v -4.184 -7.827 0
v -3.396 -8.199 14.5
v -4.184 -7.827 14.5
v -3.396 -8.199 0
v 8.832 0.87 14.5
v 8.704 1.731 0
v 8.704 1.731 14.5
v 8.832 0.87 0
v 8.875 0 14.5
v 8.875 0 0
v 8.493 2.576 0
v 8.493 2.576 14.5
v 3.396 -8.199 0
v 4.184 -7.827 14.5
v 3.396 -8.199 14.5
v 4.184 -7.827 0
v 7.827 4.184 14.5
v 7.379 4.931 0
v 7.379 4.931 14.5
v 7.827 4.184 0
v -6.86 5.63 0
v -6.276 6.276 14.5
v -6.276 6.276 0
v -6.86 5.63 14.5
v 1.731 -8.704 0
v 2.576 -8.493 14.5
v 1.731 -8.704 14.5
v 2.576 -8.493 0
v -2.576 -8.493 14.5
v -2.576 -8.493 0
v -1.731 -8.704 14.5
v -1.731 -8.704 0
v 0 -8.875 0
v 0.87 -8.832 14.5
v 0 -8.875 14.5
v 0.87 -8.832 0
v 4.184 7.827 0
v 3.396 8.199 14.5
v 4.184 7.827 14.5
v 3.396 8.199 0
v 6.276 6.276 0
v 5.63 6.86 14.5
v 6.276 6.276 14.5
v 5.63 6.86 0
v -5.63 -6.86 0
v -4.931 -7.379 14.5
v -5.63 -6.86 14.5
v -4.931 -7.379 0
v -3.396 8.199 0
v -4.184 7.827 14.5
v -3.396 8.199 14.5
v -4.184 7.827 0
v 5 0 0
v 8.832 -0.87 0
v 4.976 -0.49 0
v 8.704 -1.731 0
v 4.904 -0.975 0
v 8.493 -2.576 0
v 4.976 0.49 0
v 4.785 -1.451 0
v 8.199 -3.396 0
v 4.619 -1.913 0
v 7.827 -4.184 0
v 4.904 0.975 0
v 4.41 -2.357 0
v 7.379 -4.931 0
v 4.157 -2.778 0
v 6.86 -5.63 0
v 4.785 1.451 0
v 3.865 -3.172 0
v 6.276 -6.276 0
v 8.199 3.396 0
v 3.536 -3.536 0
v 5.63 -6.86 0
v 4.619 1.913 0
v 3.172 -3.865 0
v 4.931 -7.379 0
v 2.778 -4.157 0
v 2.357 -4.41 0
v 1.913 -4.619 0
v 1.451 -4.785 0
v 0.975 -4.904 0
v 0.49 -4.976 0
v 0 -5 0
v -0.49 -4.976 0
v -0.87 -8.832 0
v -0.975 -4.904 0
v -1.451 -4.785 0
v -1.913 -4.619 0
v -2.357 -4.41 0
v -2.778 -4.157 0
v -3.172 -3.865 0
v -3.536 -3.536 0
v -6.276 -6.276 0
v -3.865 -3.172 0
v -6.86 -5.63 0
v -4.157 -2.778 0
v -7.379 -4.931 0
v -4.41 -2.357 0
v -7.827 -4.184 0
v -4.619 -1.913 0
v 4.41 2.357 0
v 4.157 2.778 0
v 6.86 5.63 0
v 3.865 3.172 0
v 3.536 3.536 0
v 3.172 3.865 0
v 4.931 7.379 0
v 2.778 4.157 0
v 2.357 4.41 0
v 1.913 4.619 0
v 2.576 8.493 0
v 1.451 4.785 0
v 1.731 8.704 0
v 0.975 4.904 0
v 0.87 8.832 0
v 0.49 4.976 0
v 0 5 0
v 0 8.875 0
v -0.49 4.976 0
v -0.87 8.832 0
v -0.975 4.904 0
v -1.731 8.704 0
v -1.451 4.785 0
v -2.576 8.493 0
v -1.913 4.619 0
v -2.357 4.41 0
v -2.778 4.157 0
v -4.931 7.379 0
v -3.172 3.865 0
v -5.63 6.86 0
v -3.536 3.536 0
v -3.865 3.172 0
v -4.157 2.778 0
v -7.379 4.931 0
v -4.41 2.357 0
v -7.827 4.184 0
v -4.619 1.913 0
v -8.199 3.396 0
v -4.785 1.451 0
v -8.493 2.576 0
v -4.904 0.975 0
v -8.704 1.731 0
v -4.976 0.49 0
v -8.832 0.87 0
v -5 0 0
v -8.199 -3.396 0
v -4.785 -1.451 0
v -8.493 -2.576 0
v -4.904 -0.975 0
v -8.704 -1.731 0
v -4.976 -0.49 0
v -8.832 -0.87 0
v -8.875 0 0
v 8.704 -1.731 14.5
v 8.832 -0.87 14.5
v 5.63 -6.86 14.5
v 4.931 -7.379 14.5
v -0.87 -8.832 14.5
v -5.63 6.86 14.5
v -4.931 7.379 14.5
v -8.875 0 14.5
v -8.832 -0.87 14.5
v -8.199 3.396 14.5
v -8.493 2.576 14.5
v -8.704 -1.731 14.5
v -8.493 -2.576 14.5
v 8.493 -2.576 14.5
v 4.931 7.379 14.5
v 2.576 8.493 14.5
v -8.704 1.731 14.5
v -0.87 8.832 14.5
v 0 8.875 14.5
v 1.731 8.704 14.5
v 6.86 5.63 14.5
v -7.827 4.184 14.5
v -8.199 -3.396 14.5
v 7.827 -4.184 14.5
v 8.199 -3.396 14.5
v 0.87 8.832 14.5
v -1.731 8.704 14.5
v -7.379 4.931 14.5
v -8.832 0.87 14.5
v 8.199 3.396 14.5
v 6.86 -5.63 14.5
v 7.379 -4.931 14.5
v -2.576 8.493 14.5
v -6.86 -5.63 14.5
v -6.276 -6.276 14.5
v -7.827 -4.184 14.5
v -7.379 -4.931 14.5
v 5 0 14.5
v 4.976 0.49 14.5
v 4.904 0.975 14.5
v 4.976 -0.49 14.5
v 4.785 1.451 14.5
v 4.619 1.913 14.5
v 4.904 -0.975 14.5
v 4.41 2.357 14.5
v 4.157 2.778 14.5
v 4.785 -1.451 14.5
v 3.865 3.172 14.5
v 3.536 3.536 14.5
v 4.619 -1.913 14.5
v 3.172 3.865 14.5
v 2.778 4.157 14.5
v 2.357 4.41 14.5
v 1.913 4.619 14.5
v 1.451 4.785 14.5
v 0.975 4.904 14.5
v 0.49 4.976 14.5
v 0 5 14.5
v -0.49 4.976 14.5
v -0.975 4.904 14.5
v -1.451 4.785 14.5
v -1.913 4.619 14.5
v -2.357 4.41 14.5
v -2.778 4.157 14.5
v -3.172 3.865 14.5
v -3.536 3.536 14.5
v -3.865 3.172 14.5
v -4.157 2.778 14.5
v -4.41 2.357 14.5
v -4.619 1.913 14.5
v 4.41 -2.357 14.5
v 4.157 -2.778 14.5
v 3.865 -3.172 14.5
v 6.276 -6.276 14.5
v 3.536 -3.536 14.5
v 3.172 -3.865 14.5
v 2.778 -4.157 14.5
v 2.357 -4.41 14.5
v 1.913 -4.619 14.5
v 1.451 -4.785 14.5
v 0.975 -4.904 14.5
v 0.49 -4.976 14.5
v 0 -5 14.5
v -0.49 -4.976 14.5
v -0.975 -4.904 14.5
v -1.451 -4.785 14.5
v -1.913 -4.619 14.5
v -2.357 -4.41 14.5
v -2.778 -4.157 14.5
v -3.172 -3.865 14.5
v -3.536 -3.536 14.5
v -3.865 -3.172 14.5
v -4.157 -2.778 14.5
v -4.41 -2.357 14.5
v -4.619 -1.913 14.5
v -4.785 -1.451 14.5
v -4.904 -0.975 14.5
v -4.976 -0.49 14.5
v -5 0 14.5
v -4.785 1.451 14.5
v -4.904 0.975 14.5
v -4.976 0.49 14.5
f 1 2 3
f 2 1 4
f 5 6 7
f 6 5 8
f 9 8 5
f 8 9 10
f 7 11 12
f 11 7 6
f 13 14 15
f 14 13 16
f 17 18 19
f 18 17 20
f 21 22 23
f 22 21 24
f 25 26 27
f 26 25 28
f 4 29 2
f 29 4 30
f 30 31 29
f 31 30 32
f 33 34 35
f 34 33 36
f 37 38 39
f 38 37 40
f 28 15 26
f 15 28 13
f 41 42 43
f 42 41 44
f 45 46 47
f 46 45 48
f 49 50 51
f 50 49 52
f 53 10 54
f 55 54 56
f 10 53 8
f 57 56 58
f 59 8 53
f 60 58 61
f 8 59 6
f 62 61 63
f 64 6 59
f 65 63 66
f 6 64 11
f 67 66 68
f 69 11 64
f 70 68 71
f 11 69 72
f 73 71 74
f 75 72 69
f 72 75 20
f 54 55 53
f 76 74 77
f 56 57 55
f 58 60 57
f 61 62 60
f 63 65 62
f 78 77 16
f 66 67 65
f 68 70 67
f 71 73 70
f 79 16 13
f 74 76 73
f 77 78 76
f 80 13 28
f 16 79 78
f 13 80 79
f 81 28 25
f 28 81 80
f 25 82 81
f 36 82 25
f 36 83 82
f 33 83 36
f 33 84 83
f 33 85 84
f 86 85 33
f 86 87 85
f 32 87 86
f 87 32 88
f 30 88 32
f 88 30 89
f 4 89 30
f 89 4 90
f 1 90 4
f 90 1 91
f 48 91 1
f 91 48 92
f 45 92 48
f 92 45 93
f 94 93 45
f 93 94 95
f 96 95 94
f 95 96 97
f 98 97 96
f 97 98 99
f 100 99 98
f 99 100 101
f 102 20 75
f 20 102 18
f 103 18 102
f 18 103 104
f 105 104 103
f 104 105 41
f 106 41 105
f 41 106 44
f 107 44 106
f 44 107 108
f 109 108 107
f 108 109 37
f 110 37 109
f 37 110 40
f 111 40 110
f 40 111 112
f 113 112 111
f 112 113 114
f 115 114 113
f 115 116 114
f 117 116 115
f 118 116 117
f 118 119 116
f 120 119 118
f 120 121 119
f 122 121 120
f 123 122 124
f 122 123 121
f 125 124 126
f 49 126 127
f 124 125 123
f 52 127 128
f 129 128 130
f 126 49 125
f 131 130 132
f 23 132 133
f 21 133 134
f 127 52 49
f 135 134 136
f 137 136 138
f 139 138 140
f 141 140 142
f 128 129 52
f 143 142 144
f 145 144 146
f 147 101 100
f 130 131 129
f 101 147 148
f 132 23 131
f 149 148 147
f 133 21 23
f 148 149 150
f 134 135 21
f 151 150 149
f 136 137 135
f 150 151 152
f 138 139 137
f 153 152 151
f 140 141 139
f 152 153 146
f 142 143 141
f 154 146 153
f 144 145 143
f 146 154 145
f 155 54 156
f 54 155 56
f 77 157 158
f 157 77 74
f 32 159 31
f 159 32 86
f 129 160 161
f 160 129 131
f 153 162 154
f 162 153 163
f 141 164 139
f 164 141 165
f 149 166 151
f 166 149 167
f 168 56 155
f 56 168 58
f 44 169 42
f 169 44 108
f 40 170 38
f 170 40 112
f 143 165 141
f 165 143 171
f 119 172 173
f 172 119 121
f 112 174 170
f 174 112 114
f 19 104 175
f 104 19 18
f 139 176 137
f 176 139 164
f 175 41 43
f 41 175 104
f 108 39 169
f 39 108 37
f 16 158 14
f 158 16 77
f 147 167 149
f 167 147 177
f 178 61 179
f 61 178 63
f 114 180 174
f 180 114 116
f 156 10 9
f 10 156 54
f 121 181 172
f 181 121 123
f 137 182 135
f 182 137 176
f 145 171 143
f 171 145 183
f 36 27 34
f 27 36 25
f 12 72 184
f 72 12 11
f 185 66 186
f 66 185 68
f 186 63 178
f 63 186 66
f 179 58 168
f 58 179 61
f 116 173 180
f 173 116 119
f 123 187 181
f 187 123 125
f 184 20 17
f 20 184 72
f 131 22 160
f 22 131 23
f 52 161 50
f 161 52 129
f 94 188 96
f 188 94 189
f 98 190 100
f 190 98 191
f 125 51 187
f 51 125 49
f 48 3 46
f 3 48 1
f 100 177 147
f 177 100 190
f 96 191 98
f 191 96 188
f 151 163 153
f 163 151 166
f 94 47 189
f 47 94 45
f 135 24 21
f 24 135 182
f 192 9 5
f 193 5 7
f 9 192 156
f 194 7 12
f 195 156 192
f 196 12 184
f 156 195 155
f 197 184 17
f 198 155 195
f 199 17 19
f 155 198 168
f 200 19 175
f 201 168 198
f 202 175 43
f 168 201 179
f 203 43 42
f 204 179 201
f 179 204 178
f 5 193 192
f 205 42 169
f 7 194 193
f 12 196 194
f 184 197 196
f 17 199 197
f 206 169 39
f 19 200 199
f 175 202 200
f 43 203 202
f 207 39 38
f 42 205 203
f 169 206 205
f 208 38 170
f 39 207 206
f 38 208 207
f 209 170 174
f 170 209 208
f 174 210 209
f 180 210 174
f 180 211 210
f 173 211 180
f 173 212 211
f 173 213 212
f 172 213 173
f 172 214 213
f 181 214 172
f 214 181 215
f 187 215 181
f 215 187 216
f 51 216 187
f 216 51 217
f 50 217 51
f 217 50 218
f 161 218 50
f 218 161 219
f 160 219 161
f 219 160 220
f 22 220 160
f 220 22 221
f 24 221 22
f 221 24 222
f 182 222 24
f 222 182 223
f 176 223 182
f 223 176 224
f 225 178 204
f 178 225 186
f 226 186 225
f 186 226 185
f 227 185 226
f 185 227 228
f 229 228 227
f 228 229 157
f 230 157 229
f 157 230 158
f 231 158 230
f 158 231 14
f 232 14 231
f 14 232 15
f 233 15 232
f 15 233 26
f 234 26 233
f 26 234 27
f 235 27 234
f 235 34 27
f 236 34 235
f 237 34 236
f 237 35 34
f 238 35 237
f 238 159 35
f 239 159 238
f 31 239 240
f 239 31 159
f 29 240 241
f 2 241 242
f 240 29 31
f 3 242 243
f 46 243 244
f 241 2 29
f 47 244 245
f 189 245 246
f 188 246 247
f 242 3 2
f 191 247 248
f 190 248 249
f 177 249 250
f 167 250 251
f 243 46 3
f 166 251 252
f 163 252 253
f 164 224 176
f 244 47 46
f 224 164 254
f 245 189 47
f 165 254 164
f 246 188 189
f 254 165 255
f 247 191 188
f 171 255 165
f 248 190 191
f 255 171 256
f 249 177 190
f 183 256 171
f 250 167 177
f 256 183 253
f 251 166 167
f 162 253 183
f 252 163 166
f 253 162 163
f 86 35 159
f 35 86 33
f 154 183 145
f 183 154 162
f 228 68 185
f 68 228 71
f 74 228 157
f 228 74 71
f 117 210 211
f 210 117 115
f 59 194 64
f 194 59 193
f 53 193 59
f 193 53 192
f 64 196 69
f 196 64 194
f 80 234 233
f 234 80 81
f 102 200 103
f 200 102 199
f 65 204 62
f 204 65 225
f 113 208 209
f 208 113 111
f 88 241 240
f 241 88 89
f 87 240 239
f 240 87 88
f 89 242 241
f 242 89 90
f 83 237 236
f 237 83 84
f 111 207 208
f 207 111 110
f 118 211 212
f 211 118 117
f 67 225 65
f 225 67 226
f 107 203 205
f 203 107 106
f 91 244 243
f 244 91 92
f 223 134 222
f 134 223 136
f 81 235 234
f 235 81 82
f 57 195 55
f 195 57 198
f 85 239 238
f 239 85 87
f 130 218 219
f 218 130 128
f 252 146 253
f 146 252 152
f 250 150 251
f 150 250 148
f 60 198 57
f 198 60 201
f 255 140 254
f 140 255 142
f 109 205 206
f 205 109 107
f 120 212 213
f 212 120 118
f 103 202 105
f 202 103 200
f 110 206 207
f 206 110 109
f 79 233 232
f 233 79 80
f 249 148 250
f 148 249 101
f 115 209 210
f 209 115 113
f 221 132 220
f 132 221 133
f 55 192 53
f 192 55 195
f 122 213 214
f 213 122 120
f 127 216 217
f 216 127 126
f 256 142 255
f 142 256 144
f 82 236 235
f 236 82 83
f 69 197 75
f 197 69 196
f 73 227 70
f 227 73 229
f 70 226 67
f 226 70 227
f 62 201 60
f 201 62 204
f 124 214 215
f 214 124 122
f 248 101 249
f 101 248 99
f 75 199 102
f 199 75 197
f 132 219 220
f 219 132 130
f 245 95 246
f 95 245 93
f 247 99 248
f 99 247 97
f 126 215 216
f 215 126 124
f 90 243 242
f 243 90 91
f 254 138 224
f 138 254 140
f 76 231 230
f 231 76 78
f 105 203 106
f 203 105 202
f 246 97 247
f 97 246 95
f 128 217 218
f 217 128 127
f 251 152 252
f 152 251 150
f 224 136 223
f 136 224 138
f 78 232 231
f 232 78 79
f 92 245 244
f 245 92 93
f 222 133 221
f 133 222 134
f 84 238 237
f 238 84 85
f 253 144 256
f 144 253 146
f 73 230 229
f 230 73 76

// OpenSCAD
module brushless_dc_motor() {
    difference() {
        // Outer cylinder representing the stator
        cylinder(h = 14.5, d = 17.75, $fn = 64);
        
        // Inner cylinder representing the hollow part
        translate([0, 0, -1]) // Slightly extend to ensure complete cut
        cylinder(h = 16.5, d = 10, $fn = 64);
    }
}

brushless_dc_motor();
